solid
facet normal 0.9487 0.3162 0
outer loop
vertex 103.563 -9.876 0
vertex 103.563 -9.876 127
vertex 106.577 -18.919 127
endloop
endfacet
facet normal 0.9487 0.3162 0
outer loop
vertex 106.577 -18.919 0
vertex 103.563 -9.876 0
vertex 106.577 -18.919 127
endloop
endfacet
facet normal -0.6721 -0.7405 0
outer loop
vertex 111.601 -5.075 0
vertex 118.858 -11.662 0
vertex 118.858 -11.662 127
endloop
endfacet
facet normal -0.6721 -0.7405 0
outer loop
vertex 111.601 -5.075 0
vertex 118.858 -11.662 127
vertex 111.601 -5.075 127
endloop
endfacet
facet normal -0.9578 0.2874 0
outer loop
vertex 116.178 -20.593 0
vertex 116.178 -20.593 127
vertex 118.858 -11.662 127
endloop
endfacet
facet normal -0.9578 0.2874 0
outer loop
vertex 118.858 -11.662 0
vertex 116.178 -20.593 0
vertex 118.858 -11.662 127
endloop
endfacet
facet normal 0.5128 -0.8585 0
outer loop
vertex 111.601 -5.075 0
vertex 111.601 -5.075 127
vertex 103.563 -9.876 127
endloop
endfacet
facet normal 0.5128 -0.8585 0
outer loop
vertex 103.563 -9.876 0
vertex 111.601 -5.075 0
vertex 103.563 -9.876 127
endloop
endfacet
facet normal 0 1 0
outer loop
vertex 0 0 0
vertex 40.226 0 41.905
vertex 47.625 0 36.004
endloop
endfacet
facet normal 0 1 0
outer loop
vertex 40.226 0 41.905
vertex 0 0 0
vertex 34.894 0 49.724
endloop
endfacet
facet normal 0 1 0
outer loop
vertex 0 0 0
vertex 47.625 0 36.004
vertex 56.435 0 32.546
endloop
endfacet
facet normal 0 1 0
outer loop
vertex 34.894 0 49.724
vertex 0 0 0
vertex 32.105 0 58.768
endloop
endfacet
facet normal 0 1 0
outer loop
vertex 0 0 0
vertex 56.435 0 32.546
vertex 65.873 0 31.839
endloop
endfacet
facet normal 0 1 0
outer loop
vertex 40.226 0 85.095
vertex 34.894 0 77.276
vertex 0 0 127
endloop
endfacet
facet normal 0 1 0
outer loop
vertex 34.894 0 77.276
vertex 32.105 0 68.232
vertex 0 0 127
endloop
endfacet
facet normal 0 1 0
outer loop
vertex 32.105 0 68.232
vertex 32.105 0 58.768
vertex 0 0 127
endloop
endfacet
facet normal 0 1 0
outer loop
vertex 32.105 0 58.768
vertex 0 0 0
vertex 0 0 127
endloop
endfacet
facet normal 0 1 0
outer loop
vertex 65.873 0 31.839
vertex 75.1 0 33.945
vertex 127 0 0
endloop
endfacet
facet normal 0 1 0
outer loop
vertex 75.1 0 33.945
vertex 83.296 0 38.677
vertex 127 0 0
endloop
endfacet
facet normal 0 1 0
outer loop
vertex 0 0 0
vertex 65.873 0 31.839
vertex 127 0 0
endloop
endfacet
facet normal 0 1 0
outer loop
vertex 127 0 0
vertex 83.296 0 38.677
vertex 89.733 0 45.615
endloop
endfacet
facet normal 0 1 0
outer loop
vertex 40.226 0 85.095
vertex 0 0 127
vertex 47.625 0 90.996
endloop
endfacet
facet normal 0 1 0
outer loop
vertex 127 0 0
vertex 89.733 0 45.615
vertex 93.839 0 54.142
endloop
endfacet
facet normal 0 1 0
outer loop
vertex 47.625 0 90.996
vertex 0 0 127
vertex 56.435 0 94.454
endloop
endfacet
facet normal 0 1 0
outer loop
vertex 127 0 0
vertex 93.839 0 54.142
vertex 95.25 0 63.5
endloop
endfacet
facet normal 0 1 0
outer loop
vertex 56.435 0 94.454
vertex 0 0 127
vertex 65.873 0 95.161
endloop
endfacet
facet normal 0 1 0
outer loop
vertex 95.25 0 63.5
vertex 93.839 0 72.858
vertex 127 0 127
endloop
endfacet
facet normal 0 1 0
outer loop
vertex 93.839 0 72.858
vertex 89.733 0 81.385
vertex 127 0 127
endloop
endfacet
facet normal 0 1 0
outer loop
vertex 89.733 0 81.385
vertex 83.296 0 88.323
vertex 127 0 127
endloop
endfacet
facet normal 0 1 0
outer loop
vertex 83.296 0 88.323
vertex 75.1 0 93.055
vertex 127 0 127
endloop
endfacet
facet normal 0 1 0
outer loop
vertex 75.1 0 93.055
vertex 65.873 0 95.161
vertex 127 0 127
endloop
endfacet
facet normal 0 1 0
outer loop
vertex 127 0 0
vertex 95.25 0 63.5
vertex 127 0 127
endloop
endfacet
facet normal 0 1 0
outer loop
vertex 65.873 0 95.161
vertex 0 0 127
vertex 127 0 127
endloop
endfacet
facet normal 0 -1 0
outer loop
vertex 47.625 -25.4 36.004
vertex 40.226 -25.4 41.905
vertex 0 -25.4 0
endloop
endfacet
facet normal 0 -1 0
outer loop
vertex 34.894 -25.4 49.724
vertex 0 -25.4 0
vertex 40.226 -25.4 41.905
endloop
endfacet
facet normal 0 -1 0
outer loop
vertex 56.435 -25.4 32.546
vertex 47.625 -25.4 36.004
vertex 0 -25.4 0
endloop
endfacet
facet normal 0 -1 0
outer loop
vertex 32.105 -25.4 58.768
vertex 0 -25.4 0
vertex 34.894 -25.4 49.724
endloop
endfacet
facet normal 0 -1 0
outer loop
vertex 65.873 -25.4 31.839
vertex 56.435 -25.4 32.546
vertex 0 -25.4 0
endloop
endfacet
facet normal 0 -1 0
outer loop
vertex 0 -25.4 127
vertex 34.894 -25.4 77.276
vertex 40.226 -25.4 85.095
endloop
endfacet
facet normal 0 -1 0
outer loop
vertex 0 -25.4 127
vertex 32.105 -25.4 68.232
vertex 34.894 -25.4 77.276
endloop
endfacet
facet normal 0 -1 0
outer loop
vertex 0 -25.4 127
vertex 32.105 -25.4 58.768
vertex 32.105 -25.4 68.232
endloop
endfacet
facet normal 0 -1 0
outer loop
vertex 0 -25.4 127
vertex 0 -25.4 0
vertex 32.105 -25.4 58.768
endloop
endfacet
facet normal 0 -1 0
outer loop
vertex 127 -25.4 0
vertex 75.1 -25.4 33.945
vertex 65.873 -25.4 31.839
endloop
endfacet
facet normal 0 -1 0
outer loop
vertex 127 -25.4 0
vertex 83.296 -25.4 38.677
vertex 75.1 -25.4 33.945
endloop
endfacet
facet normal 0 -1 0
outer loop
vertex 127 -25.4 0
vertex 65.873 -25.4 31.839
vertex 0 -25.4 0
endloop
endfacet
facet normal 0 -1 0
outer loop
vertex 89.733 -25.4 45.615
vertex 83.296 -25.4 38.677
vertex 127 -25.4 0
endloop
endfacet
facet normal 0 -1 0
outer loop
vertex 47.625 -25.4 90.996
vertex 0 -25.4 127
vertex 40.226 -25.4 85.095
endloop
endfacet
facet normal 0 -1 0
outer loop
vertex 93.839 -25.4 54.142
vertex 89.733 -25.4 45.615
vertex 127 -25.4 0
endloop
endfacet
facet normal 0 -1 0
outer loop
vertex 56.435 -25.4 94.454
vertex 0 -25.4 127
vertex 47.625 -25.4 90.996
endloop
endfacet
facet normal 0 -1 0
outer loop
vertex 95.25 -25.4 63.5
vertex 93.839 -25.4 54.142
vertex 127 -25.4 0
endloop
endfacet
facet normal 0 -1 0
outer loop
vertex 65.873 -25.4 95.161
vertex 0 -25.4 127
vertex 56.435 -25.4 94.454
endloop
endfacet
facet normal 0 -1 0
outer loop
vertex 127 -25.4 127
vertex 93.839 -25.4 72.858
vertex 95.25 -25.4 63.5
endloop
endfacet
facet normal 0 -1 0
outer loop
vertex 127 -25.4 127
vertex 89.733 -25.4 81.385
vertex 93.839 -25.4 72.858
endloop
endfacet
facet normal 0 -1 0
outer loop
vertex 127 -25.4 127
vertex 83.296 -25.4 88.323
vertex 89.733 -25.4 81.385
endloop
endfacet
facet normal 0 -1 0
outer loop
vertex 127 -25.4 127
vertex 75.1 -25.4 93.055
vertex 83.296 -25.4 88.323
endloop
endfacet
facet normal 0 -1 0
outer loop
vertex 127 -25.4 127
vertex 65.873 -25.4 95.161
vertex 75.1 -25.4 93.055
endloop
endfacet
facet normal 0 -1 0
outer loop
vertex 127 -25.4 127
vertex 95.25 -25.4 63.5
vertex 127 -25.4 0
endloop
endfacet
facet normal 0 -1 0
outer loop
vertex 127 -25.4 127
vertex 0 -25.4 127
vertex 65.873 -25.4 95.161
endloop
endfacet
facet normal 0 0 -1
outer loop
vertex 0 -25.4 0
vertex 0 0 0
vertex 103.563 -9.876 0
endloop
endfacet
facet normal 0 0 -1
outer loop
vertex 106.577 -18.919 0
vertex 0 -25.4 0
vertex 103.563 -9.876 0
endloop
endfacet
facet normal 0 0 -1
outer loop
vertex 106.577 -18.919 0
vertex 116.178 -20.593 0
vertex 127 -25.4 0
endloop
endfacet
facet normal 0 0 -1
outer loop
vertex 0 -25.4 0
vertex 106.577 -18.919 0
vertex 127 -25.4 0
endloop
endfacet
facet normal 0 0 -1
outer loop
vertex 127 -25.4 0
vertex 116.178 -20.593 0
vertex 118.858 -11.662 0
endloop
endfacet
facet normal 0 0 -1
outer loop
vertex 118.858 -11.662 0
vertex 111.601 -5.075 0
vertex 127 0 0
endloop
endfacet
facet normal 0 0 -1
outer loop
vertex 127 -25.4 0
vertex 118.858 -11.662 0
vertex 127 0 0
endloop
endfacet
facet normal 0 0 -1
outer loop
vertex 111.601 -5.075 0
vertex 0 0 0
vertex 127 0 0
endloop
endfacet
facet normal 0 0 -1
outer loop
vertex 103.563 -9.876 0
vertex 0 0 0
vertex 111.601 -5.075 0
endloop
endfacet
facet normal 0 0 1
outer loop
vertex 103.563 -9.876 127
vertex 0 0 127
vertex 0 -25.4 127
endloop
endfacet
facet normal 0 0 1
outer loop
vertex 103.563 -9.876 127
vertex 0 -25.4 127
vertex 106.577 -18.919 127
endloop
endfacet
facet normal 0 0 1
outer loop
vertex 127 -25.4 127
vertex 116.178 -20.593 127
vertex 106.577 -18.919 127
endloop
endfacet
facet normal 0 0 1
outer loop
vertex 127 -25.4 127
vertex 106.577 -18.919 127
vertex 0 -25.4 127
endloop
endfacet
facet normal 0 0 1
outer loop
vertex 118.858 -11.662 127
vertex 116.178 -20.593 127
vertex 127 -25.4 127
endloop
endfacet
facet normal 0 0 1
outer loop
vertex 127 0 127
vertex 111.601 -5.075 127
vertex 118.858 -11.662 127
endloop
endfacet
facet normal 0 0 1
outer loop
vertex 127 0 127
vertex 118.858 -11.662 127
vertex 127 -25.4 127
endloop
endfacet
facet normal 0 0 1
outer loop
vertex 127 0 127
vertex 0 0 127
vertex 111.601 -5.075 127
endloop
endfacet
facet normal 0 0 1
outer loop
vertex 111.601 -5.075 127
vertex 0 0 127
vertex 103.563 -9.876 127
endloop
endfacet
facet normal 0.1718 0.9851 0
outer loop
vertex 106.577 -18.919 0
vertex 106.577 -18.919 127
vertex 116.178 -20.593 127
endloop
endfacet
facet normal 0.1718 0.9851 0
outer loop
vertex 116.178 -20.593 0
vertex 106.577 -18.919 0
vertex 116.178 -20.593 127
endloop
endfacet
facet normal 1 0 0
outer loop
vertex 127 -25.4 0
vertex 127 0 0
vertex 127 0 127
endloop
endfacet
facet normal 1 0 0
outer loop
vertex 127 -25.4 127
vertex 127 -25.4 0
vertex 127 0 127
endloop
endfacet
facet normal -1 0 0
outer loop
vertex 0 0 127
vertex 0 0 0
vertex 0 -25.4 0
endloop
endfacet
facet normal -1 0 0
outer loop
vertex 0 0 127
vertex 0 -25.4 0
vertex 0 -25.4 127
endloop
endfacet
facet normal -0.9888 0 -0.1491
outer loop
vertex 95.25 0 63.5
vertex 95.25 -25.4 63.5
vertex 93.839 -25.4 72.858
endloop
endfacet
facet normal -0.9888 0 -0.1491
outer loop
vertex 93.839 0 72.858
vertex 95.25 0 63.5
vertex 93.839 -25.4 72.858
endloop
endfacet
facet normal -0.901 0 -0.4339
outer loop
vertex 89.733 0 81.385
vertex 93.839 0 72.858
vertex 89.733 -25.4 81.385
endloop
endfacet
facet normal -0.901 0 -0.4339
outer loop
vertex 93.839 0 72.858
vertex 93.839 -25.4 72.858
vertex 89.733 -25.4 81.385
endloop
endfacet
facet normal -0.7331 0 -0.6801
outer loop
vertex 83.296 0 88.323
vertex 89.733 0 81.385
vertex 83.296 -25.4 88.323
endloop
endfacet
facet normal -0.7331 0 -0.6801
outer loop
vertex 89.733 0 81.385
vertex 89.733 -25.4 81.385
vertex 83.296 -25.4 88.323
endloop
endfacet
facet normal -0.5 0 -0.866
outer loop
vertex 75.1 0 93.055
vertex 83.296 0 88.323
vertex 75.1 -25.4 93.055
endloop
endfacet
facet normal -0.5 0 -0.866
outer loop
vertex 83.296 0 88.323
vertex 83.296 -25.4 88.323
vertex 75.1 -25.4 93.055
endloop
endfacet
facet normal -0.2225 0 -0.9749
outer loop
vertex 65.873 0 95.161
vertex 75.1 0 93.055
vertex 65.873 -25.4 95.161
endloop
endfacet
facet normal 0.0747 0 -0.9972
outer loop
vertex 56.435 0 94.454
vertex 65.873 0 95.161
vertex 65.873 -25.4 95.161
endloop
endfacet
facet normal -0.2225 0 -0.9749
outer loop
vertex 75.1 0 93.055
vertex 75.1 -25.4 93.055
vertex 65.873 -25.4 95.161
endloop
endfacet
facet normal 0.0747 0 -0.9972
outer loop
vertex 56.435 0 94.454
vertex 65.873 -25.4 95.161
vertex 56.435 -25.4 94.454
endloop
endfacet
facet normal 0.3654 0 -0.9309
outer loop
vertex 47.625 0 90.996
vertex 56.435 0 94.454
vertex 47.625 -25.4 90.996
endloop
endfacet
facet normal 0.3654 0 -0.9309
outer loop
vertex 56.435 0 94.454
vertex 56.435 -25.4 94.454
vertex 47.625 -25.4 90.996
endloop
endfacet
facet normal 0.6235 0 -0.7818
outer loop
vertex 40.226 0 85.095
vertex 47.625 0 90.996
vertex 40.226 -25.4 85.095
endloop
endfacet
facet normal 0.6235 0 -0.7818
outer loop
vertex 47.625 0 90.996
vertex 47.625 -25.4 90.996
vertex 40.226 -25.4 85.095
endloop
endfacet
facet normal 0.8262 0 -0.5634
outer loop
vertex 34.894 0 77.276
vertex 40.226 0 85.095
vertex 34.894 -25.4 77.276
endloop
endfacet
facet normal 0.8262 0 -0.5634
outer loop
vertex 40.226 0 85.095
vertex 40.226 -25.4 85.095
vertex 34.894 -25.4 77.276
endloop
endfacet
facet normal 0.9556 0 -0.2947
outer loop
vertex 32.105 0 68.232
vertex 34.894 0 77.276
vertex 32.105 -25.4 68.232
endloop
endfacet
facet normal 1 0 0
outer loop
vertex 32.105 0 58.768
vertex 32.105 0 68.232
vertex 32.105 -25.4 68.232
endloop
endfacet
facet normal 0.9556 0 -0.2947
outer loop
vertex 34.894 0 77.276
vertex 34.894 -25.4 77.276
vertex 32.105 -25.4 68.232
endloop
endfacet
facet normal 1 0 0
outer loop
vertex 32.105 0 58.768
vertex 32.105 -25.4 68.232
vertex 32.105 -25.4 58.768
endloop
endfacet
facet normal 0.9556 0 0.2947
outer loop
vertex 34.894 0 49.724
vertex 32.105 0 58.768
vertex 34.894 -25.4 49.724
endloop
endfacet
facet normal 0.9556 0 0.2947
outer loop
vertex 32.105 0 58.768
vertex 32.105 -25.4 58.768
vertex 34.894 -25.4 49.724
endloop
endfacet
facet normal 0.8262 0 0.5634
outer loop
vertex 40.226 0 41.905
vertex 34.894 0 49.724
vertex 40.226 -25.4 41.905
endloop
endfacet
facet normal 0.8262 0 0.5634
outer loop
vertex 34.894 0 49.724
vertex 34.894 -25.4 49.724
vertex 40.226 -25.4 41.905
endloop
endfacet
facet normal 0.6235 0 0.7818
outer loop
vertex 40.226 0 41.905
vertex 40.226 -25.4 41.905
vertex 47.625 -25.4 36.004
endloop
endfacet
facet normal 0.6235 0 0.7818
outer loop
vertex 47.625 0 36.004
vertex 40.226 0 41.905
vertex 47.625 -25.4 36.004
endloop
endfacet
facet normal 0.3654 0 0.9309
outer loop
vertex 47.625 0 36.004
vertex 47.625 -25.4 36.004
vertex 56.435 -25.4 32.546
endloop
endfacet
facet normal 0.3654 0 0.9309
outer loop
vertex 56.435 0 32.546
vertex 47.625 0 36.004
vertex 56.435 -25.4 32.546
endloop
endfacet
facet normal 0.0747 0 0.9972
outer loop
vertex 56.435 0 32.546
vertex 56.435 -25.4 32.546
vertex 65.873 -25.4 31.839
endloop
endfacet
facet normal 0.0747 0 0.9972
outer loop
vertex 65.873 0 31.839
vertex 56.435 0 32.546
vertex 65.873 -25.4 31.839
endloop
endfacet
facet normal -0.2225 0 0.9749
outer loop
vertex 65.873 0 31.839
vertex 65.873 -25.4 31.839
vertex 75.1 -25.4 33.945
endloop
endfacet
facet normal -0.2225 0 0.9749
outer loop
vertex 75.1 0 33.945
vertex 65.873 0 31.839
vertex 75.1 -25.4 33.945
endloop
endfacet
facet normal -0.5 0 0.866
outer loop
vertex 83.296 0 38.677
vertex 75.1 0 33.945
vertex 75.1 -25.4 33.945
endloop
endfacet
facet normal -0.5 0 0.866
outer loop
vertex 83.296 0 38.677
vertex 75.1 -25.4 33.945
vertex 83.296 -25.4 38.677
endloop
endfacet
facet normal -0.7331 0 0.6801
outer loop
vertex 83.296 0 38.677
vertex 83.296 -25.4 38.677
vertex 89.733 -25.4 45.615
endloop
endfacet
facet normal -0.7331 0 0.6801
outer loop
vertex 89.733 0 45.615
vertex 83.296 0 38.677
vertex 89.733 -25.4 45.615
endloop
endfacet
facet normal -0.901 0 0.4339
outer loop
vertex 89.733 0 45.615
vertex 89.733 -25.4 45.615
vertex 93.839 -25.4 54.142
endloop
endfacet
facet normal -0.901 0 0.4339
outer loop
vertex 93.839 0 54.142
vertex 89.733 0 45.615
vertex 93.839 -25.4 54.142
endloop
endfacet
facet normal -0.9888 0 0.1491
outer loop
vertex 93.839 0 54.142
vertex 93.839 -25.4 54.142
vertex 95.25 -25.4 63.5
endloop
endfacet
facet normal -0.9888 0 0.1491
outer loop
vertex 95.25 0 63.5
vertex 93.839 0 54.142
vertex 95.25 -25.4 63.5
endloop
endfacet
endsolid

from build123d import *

# Parameters (mm, degrees)
F0_W     = 127
F0_H     = 127
F1_DEPTH = 25.4
F2_R     = 31.75
F3_DEPTH = 25.401
F5_DEPTH = 127.001


with BuildPart() as f1:
    # F0 (on Front) → F1 (new body)
    with BuildSketch(Plane.XZ):
        with Locations((63.5, 63.5)):
            Rectangle(F0_W, F0_H)
    extrude(amount=F1_DEPTH)

    # F2 (on face) → F3 (cut, through all)
    with BuildSketch(Plane.XZ.offset(25.4)):
        with Locations((63.5, 63.5)):
            Circle(F2_R)
    extrude(amount=-F3_DEPTH, mode=Mode.SUBTRACT)

    # F4 (on face) → F5 (cut, through all)
    with BuildSketch(Plane.XY.offset(127)):
        Polygon((111.601122, -5.075065), (103.562877, -9.875687), (106.577218, -18.918719), (116.17846, -20.593353), (118.857875, -11.661964), align=None)
    extrude(amount=-F5_DEPTH, mode=Mode.SUBTRACT)


solid = f1.part
